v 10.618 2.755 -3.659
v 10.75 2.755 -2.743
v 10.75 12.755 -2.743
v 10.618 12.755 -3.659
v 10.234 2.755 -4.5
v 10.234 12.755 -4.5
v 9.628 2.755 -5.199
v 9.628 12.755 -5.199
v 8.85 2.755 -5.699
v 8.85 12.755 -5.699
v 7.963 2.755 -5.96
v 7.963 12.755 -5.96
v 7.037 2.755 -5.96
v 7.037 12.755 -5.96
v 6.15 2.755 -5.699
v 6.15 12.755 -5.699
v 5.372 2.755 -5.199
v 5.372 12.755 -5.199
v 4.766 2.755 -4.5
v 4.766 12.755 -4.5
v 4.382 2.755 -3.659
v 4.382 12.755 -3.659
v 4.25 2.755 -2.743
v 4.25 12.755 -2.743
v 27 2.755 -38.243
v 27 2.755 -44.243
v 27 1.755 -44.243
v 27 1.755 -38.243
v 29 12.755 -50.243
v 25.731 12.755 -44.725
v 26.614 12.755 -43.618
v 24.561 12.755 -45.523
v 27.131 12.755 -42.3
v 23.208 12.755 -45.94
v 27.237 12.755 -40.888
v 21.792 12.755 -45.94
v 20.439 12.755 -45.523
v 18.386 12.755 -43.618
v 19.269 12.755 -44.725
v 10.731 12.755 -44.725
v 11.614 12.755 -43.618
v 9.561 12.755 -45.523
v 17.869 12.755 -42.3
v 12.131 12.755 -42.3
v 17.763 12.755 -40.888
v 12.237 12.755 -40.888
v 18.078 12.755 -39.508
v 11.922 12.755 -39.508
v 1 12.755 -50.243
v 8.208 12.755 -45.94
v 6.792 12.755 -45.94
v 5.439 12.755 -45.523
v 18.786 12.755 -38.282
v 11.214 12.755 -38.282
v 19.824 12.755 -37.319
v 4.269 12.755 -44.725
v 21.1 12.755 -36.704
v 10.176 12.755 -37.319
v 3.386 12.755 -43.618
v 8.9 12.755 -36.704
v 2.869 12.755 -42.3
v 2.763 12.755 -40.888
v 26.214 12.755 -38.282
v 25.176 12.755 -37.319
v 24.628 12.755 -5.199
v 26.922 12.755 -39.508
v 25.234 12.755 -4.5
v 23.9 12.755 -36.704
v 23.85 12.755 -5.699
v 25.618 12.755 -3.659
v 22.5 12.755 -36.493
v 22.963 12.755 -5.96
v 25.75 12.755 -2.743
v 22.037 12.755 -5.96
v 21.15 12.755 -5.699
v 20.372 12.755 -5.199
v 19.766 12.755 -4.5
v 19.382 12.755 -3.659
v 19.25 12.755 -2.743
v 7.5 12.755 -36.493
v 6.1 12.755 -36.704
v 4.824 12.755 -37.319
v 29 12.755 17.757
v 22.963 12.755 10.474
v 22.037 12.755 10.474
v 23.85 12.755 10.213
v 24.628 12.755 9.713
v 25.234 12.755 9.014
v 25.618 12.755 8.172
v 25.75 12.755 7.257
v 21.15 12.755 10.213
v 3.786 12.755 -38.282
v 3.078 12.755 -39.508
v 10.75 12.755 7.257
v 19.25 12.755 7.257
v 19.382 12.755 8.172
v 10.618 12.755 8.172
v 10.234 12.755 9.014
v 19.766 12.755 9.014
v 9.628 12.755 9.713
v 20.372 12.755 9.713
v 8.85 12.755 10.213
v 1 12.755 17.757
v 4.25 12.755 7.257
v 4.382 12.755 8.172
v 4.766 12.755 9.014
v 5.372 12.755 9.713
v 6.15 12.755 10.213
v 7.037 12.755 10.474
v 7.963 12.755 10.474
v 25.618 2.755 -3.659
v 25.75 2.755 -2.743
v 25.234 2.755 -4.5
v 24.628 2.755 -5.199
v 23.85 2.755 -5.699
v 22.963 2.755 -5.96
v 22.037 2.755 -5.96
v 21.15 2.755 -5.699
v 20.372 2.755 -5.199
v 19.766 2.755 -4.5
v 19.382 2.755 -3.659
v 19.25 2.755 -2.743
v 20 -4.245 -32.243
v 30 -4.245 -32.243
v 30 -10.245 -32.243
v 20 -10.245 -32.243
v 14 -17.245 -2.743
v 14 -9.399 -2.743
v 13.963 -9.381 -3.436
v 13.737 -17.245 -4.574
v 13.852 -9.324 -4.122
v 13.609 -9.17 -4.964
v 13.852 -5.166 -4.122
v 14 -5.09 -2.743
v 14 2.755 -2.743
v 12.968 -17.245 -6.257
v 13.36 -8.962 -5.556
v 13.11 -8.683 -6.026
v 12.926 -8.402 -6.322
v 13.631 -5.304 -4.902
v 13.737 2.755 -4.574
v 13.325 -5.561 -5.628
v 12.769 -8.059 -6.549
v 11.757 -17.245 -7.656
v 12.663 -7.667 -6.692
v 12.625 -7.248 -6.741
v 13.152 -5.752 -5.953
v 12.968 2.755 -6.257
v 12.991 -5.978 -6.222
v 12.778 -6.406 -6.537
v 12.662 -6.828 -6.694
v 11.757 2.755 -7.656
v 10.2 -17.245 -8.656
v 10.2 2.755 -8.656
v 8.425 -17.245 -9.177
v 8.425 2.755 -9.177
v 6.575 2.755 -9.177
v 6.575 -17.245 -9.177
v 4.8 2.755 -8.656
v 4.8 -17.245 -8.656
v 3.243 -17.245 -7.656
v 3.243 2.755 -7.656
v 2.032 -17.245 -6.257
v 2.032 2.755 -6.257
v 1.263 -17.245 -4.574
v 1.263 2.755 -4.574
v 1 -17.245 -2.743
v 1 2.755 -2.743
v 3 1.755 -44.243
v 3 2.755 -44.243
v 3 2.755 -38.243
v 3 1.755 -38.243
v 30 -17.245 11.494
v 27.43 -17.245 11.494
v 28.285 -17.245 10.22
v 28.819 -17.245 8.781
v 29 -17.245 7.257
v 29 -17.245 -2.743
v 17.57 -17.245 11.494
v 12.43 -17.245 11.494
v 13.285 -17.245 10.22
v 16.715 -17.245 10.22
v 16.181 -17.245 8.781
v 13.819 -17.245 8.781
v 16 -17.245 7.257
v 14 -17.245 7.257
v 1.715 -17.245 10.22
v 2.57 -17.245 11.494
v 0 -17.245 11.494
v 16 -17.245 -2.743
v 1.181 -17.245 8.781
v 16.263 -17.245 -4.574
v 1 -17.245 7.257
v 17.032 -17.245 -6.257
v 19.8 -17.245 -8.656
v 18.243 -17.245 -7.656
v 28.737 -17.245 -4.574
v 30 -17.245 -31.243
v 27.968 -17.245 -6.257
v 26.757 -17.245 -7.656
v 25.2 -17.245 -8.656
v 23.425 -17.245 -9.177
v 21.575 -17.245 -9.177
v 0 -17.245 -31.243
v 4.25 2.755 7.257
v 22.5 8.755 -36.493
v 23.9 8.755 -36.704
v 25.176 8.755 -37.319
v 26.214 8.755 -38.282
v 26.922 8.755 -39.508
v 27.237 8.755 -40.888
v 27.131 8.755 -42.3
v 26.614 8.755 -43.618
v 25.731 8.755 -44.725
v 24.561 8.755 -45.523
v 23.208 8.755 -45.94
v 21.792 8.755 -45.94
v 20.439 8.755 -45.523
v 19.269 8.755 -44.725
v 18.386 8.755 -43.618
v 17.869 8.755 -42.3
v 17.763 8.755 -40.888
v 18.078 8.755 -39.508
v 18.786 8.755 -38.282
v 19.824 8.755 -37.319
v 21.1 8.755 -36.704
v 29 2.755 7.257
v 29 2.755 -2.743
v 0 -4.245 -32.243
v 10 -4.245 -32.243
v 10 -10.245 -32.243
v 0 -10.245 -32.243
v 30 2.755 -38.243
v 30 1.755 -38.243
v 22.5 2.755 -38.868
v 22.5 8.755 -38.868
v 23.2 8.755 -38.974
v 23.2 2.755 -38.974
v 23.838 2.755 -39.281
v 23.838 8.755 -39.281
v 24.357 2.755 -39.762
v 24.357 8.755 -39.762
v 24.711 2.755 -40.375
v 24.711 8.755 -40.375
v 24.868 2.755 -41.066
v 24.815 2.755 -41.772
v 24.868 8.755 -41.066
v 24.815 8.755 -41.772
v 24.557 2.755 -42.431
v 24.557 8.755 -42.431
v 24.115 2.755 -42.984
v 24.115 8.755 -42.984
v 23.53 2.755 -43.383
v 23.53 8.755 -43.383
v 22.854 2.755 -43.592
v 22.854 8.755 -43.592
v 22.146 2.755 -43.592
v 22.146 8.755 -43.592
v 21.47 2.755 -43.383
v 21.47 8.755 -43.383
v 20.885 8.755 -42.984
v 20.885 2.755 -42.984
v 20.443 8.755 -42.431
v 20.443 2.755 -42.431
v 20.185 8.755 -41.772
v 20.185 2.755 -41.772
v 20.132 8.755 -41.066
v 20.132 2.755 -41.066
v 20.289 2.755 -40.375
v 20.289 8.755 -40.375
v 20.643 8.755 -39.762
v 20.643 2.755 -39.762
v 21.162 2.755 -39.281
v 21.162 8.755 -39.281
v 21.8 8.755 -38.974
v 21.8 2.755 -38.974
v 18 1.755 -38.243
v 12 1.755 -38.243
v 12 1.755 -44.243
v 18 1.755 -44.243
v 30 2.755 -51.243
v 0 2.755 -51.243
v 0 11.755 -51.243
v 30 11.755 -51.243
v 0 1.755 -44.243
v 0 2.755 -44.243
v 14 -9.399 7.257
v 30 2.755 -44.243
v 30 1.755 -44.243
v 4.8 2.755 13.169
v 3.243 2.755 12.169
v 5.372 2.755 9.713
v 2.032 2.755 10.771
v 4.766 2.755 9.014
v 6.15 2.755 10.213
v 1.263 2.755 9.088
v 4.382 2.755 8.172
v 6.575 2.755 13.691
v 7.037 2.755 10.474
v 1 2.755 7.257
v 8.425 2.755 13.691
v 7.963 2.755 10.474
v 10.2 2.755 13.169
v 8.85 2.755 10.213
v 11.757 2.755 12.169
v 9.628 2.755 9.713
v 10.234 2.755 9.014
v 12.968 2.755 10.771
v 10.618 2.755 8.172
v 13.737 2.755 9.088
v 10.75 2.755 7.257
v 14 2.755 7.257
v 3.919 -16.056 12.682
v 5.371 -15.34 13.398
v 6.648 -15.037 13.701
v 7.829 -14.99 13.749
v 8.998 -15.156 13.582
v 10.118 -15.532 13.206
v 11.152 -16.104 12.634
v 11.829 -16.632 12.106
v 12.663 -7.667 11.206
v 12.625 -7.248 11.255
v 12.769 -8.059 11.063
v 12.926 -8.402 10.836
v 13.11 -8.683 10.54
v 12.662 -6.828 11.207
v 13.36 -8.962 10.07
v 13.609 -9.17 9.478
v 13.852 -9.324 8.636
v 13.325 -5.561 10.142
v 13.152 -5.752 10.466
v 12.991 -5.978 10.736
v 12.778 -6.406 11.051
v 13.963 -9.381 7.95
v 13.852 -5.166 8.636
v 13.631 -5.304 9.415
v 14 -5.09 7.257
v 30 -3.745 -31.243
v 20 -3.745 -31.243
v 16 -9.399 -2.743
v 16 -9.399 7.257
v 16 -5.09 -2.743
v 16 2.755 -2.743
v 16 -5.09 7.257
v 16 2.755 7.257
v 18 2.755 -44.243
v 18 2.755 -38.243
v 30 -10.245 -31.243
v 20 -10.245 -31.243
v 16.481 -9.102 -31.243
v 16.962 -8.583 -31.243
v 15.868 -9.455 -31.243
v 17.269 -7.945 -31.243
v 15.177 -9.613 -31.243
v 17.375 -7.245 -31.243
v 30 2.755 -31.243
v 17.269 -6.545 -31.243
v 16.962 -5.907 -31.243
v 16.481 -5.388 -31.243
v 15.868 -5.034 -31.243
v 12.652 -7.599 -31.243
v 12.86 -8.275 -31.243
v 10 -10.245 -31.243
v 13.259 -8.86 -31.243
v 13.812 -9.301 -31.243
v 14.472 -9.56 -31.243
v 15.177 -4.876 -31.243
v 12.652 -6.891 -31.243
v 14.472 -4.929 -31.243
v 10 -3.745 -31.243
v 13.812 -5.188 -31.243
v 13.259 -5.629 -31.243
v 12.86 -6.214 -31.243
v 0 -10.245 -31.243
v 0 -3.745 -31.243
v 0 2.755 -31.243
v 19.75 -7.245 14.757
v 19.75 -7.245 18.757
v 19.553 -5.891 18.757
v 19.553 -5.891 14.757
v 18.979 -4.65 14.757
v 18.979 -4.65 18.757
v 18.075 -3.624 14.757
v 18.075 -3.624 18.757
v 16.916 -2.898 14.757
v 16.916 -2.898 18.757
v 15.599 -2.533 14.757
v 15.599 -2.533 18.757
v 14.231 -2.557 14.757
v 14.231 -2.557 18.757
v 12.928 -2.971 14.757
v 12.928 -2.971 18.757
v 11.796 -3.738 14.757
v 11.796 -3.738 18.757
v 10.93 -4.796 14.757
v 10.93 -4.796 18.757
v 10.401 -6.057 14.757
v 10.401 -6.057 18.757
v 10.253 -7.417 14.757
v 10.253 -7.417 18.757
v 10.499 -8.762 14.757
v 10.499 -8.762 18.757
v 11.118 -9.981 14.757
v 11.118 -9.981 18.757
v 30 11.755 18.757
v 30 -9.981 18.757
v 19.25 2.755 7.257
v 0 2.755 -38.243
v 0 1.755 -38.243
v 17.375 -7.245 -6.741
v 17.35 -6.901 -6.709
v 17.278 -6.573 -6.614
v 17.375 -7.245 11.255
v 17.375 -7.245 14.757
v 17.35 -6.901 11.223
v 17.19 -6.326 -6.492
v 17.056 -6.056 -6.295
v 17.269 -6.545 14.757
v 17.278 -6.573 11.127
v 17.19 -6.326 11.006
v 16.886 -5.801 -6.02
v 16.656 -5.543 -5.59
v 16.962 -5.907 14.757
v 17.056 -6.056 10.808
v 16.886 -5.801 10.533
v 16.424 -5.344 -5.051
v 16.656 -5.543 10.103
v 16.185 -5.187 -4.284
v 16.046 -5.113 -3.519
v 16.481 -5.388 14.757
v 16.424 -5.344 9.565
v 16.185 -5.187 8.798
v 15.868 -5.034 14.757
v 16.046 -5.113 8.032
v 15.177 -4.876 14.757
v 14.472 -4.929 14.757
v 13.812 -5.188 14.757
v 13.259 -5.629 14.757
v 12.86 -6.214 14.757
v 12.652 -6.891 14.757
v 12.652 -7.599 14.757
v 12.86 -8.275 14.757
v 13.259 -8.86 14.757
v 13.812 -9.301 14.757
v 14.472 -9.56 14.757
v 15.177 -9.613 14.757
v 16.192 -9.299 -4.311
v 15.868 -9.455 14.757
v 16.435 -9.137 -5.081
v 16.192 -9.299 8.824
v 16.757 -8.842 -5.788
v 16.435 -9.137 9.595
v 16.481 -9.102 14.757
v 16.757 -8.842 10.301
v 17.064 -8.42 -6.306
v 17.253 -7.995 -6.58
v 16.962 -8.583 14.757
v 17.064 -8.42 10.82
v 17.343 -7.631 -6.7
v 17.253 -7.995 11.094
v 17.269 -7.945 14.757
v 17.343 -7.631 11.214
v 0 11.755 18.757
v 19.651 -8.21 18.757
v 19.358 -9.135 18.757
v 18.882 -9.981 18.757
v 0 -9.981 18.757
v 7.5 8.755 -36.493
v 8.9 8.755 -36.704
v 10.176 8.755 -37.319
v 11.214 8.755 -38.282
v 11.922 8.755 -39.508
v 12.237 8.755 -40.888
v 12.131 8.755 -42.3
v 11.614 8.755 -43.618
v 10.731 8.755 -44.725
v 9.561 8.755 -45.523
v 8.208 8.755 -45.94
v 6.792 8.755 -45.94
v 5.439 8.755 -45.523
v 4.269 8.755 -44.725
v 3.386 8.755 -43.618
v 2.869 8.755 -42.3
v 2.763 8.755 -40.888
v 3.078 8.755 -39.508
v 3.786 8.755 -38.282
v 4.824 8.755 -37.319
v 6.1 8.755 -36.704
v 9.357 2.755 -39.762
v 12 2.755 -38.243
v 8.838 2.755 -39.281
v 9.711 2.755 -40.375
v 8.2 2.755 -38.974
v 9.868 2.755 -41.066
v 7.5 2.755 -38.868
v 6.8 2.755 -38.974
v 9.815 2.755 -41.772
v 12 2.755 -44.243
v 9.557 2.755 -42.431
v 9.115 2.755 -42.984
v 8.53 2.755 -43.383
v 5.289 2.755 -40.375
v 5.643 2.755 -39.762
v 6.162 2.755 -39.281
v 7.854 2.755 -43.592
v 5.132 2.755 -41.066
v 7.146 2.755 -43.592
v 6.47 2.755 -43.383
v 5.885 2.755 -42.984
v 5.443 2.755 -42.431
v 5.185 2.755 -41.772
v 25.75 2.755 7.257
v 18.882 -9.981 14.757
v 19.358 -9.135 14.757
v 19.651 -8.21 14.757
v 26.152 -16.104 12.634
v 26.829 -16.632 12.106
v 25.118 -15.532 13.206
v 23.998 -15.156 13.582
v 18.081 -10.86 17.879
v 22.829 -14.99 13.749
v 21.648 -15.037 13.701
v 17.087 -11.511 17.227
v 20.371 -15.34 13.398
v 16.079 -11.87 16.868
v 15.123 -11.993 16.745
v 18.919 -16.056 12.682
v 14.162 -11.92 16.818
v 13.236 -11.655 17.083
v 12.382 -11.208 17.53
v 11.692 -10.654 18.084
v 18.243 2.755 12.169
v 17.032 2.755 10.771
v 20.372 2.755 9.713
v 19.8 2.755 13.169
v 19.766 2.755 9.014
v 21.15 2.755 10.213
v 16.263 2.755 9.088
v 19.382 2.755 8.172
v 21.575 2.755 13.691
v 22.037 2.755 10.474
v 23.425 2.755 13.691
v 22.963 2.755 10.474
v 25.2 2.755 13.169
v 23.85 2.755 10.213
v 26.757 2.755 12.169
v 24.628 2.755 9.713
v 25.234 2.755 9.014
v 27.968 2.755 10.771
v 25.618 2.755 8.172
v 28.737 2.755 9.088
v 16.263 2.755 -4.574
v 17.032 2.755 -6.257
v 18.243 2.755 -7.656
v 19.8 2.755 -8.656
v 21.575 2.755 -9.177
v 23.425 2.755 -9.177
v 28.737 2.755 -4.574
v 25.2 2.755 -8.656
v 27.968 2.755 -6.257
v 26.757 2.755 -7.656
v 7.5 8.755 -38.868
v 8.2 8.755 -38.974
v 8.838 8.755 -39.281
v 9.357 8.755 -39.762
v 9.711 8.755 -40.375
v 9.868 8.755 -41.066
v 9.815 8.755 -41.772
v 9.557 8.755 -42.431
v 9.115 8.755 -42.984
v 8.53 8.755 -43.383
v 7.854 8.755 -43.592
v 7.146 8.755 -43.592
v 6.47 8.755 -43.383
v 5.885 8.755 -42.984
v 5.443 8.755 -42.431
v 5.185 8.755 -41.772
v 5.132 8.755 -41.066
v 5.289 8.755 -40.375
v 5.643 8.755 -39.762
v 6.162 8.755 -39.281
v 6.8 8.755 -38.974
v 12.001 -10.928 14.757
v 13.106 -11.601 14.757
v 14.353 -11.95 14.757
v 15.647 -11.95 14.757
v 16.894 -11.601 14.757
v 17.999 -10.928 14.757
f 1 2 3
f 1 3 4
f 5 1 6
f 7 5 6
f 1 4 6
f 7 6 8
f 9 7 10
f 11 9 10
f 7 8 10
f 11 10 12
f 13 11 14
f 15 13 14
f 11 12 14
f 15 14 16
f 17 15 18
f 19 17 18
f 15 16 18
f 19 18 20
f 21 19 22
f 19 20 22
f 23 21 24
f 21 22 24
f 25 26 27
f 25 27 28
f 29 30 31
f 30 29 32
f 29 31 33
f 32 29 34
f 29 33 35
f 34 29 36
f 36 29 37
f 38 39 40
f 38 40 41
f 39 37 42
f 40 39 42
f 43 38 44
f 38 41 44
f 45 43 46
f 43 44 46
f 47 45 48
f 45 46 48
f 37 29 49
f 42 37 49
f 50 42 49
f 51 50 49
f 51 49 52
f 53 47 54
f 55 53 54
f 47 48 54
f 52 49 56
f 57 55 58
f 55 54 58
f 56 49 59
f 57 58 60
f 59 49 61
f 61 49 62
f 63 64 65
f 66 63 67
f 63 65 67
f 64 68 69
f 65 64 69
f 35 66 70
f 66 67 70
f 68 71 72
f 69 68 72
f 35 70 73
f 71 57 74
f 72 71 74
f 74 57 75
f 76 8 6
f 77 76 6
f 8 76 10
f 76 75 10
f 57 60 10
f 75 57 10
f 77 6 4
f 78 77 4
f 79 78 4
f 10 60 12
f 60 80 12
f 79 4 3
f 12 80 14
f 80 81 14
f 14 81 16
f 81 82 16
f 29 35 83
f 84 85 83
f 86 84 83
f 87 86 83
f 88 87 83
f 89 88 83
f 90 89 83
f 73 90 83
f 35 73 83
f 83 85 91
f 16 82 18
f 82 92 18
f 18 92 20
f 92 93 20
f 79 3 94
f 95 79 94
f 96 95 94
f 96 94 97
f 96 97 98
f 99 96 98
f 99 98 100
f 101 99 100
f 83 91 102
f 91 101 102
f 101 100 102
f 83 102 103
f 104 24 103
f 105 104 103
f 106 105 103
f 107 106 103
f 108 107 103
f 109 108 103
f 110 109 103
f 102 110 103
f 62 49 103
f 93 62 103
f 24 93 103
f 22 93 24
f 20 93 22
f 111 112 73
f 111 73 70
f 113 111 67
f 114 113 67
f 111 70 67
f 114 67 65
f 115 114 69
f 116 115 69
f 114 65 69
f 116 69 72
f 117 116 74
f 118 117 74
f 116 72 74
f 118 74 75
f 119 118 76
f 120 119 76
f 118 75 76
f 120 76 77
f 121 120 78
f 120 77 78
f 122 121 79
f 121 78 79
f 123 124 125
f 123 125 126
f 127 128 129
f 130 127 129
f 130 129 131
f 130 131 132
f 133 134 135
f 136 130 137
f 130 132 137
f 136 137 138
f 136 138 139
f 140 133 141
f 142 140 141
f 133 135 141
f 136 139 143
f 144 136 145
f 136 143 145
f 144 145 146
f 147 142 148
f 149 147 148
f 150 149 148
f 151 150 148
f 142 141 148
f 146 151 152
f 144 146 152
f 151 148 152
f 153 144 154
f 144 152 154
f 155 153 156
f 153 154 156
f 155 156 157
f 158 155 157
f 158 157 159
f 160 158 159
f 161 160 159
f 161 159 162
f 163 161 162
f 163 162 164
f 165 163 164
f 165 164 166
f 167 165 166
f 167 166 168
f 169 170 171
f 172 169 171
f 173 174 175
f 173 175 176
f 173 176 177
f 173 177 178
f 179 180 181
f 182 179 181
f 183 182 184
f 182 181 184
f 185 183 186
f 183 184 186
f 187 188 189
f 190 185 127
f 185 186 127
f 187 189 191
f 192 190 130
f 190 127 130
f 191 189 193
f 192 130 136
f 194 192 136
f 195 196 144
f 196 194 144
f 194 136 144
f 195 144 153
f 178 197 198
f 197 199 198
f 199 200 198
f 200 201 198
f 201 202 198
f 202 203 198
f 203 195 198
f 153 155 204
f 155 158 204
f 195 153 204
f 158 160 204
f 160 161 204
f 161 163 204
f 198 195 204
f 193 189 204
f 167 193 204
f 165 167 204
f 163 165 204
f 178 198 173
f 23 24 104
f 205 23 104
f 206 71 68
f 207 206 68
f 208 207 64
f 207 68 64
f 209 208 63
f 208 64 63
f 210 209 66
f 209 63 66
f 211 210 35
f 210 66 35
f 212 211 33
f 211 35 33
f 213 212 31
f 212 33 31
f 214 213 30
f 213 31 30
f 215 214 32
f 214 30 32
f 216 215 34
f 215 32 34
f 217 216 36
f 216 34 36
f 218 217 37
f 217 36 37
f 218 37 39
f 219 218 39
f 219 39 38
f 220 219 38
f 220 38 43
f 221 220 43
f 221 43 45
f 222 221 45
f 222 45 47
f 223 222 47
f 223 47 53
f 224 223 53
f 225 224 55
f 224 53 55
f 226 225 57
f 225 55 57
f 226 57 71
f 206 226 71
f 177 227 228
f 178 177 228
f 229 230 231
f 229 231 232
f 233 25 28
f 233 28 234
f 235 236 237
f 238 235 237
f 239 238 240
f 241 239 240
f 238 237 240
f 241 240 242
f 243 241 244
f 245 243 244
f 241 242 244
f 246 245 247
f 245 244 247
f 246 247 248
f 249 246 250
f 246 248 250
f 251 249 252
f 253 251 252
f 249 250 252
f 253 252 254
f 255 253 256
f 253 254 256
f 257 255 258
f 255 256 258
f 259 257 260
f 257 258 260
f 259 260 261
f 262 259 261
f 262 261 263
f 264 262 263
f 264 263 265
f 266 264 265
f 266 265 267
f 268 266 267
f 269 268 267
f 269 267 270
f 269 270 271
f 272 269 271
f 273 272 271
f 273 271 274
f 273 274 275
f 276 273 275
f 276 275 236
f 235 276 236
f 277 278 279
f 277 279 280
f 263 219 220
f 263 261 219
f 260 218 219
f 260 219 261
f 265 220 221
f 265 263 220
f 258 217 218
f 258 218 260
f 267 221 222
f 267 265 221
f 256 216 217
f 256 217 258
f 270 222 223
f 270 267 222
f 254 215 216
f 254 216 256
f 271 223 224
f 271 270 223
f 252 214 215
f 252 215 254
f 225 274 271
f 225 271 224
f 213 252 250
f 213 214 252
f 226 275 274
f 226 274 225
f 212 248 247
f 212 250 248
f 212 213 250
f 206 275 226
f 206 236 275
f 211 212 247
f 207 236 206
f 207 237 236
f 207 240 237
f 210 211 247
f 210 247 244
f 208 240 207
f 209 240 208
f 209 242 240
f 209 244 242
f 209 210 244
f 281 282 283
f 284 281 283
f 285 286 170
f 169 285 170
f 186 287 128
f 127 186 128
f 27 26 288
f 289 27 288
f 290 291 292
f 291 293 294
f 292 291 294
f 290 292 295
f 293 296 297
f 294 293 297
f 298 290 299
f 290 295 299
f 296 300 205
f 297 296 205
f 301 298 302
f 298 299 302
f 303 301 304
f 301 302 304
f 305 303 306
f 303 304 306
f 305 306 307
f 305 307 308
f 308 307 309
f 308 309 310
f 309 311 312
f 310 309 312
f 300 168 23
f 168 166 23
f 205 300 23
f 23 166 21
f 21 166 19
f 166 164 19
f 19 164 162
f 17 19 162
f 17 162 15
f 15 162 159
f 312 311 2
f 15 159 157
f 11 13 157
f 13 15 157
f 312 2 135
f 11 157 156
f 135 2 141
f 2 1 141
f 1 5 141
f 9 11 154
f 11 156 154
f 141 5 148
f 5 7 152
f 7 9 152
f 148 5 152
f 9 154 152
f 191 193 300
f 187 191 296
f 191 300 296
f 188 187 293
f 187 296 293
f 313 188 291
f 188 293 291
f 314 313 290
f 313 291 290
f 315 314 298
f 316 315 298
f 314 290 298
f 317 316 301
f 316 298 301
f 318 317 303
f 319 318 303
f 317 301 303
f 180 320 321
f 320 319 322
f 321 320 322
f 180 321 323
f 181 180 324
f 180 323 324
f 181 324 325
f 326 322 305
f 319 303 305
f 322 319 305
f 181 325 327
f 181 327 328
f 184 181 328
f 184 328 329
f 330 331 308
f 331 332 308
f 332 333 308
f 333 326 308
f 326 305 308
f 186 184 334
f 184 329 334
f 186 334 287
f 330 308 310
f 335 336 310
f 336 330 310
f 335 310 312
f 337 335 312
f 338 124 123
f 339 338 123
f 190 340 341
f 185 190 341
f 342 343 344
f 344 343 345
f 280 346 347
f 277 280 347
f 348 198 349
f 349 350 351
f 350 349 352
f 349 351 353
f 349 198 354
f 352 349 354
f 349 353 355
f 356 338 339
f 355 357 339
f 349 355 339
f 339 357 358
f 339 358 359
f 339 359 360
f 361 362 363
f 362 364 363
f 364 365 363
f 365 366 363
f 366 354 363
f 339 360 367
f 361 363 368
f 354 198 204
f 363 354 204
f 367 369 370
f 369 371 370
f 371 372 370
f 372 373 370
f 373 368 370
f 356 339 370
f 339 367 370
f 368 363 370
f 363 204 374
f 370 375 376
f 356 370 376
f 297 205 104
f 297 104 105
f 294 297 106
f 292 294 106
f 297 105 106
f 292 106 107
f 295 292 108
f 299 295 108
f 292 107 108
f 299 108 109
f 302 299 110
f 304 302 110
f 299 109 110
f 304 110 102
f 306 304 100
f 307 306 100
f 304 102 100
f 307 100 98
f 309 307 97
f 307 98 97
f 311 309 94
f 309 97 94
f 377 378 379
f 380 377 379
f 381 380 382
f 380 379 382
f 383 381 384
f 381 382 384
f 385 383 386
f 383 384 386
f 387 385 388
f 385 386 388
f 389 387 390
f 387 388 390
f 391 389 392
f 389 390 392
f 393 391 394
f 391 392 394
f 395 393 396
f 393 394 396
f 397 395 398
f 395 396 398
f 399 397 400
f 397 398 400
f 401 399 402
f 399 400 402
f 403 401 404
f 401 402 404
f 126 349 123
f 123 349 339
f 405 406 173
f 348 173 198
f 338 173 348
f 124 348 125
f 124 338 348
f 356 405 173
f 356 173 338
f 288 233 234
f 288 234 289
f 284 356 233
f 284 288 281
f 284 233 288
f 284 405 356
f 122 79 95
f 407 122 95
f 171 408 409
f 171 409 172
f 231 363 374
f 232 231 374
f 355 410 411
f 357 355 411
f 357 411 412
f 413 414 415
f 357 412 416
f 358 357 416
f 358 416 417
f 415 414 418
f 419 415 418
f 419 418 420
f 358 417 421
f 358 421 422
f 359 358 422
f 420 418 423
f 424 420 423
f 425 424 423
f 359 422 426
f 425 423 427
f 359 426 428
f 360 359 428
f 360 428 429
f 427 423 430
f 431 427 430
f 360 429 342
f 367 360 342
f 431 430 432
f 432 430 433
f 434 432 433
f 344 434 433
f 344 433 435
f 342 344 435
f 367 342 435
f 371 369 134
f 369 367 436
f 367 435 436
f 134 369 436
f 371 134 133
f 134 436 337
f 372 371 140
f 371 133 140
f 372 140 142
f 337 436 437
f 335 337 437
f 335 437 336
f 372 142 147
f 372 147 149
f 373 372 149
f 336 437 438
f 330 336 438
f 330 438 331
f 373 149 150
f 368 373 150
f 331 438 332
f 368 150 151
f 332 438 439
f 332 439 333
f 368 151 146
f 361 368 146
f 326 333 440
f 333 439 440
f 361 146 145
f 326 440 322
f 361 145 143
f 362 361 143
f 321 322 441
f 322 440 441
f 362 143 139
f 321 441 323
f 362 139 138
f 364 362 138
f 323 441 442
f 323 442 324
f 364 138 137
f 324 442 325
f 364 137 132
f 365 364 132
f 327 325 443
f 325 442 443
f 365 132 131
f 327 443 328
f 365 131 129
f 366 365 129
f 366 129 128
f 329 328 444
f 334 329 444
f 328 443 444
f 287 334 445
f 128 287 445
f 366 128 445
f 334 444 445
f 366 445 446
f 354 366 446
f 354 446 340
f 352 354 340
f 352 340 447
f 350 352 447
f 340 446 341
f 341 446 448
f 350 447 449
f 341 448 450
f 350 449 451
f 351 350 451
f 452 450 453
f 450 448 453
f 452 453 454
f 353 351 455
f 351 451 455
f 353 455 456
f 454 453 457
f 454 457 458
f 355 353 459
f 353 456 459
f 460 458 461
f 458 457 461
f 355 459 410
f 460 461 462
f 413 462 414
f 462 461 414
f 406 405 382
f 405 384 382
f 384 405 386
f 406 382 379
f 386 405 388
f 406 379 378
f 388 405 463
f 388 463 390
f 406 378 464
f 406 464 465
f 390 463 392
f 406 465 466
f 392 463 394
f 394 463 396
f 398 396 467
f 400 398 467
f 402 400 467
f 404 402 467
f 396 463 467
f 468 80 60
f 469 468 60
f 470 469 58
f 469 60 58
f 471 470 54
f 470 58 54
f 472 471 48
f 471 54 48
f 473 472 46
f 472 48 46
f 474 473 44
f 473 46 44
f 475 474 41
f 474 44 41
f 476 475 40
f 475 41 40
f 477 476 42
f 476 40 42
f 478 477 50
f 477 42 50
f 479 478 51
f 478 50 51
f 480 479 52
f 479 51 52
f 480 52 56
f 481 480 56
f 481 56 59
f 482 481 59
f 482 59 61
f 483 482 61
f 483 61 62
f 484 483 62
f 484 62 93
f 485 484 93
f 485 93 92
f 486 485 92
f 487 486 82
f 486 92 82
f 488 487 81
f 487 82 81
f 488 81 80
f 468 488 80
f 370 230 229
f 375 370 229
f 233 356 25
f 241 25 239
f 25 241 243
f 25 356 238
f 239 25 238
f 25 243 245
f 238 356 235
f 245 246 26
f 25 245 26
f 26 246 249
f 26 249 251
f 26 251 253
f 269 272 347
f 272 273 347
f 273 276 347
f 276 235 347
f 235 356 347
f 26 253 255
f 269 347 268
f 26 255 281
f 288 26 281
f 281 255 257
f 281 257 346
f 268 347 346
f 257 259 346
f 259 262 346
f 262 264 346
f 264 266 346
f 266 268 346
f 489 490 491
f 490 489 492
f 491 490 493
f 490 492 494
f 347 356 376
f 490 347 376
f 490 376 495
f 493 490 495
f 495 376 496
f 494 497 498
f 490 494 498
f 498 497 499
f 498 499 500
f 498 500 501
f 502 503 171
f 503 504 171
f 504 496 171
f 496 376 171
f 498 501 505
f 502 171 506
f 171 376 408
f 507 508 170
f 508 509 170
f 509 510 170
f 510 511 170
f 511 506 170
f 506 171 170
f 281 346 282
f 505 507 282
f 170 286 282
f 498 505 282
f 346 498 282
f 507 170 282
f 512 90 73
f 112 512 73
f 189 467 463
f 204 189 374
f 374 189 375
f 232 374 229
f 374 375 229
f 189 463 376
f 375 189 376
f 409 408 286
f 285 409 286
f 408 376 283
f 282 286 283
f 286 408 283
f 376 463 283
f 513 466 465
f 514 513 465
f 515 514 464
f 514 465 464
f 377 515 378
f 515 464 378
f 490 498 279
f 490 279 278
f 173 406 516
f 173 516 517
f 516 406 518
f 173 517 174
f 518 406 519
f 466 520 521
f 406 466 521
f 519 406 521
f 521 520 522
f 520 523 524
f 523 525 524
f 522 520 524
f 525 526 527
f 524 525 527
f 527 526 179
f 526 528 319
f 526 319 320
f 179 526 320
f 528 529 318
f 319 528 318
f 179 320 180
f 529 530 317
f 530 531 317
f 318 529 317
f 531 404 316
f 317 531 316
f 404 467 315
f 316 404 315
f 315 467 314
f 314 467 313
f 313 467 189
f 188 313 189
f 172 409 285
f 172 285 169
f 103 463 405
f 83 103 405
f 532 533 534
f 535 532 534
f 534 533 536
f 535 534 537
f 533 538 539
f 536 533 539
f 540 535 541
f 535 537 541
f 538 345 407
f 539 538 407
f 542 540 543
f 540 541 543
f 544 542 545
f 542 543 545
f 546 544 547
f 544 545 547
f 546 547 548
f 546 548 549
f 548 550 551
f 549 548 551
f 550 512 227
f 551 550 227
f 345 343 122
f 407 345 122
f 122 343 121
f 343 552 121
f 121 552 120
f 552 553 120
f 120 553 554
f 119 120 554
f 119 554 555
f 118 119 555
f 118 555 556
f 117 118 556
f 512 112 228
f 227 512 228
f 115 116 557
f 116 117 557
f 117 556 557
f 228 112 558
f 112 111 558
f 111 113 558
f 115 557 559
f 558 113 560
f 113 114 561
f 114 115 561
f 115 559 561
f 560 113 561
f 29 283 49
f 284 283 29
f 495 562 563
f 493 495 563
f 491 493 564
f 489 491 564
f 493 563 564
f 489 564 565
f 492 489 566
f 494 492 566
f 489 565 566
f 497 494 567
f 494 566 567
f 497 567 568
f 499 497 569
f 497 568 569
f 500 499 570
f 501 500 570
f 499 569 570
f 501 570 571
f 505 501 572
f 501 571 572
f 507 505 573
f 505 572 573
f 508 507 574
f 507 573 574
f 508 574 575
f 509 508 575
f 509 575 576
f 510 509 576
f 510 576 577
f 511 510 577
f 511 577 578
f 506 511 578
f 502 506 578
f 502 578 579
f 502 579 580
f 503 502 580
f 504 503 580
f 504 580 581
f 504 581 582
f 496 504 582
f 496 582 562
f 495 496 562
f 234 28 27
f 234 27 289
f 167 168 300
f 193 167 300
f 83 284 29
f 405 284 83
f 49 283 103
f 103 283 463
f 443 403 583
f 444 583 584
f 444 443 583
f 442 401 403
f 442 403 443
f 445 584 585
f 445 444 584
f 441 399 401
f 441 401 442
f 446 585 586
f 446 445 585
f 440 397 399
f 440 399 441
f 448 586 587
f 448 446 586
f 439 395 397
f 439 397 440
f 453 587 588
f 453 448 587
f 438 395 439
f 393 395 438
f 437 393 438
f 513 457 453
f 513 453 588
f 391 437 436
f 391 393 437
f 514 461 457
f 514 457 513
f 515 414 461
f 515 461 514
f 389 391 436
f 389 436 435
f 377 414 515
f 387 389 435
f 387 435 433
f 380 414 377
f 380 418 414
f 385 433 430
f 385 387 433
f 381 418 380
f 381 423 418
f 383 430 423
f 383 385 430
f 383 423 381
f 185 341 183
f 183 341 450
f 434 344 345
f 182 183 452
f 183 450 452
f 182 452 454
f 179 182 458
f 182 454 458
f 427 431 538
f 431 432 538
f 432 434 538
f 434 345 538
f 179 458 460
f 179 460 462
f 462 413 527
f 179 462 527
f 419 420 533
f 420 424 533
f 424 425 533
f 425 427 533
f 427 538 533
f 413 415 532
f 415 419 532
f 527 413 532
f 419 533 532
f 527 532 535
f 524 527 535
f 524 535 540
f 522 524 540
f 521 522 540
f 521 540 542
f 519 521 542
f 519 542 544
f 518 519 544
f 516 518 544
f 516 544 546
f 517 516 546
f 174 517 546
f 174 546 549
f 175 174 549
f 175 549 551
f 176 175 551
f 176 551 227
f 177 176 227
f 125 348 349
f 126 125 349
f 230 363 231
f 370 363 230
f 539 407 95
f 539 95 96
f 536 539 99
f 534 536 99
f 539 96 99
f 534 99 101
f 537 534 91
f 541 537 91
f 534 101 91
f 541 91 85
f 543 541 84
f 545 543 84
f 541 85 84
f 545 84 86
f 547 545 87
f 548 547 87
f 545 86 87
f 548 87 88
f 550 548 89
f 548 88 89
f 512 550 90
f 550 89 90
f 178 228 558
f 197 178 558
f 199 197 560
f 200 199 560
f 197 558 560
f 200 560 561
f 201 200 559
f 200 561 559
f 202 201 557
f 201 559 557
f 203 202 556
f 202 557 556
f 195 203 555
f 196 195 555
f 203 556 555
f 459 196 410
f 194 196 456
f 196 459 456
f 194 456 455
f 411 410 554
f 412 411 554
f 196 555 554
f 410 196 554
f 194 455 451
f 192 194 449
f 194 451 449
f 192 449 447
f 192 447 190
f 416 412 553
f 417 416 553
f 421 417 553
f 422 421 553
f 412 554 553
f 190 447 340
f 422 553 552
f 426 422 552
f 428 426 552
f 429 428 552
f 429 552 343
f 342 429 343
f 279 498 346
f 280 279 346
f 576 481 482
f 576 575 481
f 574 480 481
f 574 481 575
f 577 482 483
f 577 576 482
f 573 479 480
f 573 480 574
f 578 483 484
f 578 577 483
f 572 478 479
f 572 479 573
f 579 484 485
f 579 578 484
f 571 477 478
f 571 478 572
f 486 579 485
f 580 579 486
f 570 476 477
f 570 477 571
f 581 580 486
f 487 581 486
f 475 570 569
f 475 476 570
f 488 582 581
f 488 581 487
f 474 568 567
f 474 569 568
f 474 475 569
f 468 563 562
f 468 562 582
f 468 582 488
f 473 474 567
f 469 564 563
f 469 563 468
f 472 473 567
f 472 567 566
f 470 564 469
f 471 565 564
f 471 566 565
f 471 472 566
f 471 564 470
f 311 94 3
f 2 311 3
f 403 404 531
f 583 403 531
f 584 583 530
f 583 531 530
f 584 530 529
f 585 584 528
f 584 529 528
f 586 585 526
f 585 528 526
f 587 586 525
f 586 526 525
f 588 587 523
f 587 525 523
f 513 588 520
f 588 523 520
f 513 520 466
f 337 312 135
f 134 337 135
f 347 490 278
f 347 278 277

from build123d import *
from OCP.BRepFilletAPI import BRepFilletAPI_MakeChamfer

# Parameters (mm, degrees)
RESSALTO_EXTRUS_O1_DEPTH = 30
CORTE_EXTRUS_O1_REACH    = 68.527
ESBO_O2_R                = 2.375
ESBO_O2_3_R              = 4.75
ESBO_O2_3_R_2            = 2.375
CORTE_EXTRUS_O3_DEPTH    = 4
CORTE_EXTRUS_O2_REACH    = 80.086
ESBO_O3_R                = 2.375
ESBO_O3_3_R              = 2.375
CORTE_EXTRUS_O4_DEPTH    = 4
ESBO_O4_W                = 6
ESBO_O4_H                = 6
ESBO_O4_W_2              = 3
RESSALTO_EXTRUS_O2_DEPTH = 1
CORTE_EXTRUS_O5_START    = -10
CORTE_EXTRUS_O5_DEPTH    = 57.527149202
CHANFRO1_SIZE            = 1
ESBO_O6_W                = 10
ESBO_O6_H                = 6
RESSALTO_EXTRUS_O3_DEPTH = 1
CHANFRO2_SIZE            = 0.5
CHANFRO2_SIZE_2          = 1


with BuildPart() as part:
    # Esboço1 → Ressalto-extrusão1 (new body)
    with BuildSketch(Plane(origin=(0, 0, 0), x_dir=(0, 0, -1), z_dir=(1, 0, 0))):
        Polygon((51.243161309, 12.755336939), (-18.756838691, 12.755336939), (-18.756838691, -9.981327227), (-11.493502857, -17.244663061), (31.243161309, -17.244663061), (31.243161309, 2.755336939), (51.243161309, 2.755336939), align=None)
    extrude(amount=RESSALTO_EXTRUS_O1_DEPTH)

    # Esboço2 → Corte-extrusão1 (cut, up to next)
    with BuildSketch(Plane(origin=(0, 12.755336939, 0), x_dir=(1, 0, 0), z_dir=(0, 1, 0)), mode=Mode.PRIVATE) as corte_extrus_o1_sk1:
        with Locations(Location((7.5, 41.243161309, 0), (0, 0, 270))):
            Circle(ESBO_O2_R)
    corte_extrus_o1_tool1 = extrude(corte_extrus_o1_sk1.sketch, amount=-CORTE_EXTRUS_O1_REACH, mode=Mode.PRIVATE) & part.part
    # Esboço2 → Corte-extrusão1 (cut, up to next)
    with BuildSketch(Plane(origin=(0, 12.755336939, 0), x_dir=(1, 0, 0), z_dir=(0, 1, 0)), mode=Mode.PRIVATE) as corte_extrus_o1_sk2:
        with Locations(Location((22.5, 41.243161309, 0), (0, 0, 270))):
            Circle(ESBO_O2_R)
    corte_extrus_o1_tool2 = extrude(corte_extrus_o1_sk2.sketch, amount=-CORTE_EXTRUS_O1_REACH, mode=Mode.PRIVATE) & part.part
    # Esboço2 → Corte-extrusão1 (cut, up to next)
    with BuildSketch(Plane(origin=(0, 12.755336939, 0), x_dir=(1, 0, 0), z_dir=(0, 1, 0)), mode=Mode.PRIVATE) as corte_extrus_o1_sk3:
        with BuildLine():
            Line((4.25, 2.743161309), (4.25, -7.256838691))
            ThreePointArc((4.25, -7.256838691), (7.5, -10.506838691), (10.75, -7.256838691))
            Line((10.75, -7.256838691), (10.75, 2.743161309))
            ThreePointArc((10.75, 2.743161309), (7.5, 5.993161309), (4.25, 2.743161309))
        make_face()
    corte_extrus_o1_tool3 = extrude(corte_extrus_o1_sk3.sketch, amount=-CORTE_EXTRUS_O1_REACH, mode=Mode.PRIVATE) & part.part
    # Esboço2 → Corte-extrusão1 (cut, up to next)
    with BuildSketch(Plane(origin=(0, 12.755336939, 0), x_dir=(1, 0, 0), z_dir=(0, 1, 0)), mode=Mode.PRIVATE) as corte_extrus_o1_sk4:
        with BuildLine():
            Line((19.25, 2.743161309), (19.25, -7.256838691))
            ThreePointArc((19.25, -7.256838691), (22.5, -10.506838691), (25.75, -7.256838691))
            Line((25.75, -7.256838691), (25.75, 2.743161309))
            ThreePointArc((25.75, 2.743161309), (22.5, 5.993161309), (19.25, 2.743161309))
        make_face()
    corte_extrus_o1_tool4 = extrude(corte_extrus_o1_sk4.sketch, amount=-CORTE_EXTRUS_O1_REACH, mode=Mode.PRIVATE) & part.part
    add(corte_extrus_o1_tool1.solids().sort_by_distance((7.5, 12.755337, -41.243161))[0], mode=Mode.SUBTRACT)
    add(corte_extrus_o1_tool2.solids().sort_by_distance((22.5, 12.755337, -41.243161))[0], mode=Mode.SUBTRACT)
    add(corte_extrus_o1_tool3.solids().sort_by_distance((7.5, 12.755337, 2.256839))[0], mode=Mode.SUBTRACT)
    add(corte_extrus_o1_tool4.solids().sort_by_distance((22.5, 12.755337, 2.256839))[0], mode=Mode.SUBTRACT)

    # Esboço2<3> → Corte-extrusão3 (cut)
    # profile 1 of 2: a face of its own
    with BuildSketch(Plane(origin=(0, 12.755336939, 0), x_dir=(1, 0, 0), z_dir=(0, 1, 0))):
        with Locations(Location((7.5, 41.243161309, 0), (0, 0, 270))):
            Circle(ESBO_O2_3_R)
        with Locations(Location((7.5, 41.243161309, 0), (0, 0, 270))):
            Circle(ESBO_O2_3_R_2, mode=Mode.SUBTRACT)
    # profile 2 of 2: a face of its own
    with BuildSketch(Plane(origin=(0, 12.755336939, 0), x_dir=(1, 0, 0), z_dir=(0, 1, 0))):
        with Locations(Location((22.5, 41.243161309, 0), (0, 0, 270))):
            Circle(ESBO_O2_3_R)
        with Locations(Location((22.5, 41.243161309, 0), (0, 0, 270))):
            Circle(ESBO_O2_3_R_2, mode=Mode.SUBTRACT)
    extrude(amount=-CORTE_EXTRUS_O3_DEPTH, mode=Mode.SUBTRACT)

    # Esboço3 → Corte-extrusão2 (cut, up to next)
    with BuildSketch(Plane.XY.offset(18.756838691), mode=Mode.PRIVATE) as corte_extrus_o2_sk1:
        with Locations((15, -7.244663061)):
            Circle(ESBO_O3_R)
    corte_extrus_o2_tool1 = extrude(corte_extrus_o2_sk1.sketch, amount=-CORTE_EXTRUS_O2_REACH, mode=Mode.PRIVATE) & part.part
    add(corte_extrus_o2_tool1.solids().sort_by_distance((15, -7.244663, 18.756839))[0], mode=Mode.SUBTRACT)

    # Esboço3<3> → Corte-extrusão4 (cut)
    # profile 1 of 2: a face of its own
    with BuildSketch(Plane.XY.offset(18.756838691)):
        with BuildLine():
            Line((18.882417963, -9.981327227), (11.117582037, -9.981327227))
            ThreePointArc((11.117582037, -9.981327227), (15, -11.994663061), (18.882417963, -9.981327227))
        make_face()
    # profile 2 of 2: a face of its own
    with BuildSketch(Plane.XY.offset(18.756838691)):
        with BuildLine():
            ThreePointArc((18.882417963, -9.981327227), (19.527912617, -8.680109799), (19.75, -7.244663061))
            ThreePointArc((19.75, -7.244663061), (13.564553262, -2.716750444), (11.117582037, -9.981327227))
            Line((11.117582037, -9.981327227), (18.882417963, -9.981327227))
        make_face()
        with Locations((15, -7.244663061)):
            Circle(ESBO_O3_3_R, mode=Mode.SUBTRACT)
    extrude(amount=-CORTE_EXTRUS_O4_DEPTH, mode=Mode.SUBTRACT)

    # Esboço4 → Ressalto-extrusão2 (add)
    with BuildSketch(Plane.XZ.offset(-2.755336939)):
        with Locations((15, -41.243161309)):
            Rectangle(ESBO_O4_W, ESBO_O4_H)
        with Locations((1.5, -41.243161309)):
            Rectangle(ESBO_O4_W_2, ESBO_O4_H)
        with Locations((28.5, -41.243161309)):
            Rectangle(ESBO_O4_W_2, ESBO_O4_H)
    extrude(amount=RESSALTO_EXTRUS_O2_DEPTH)

    # Esboço2<4> → Corte-extrusão5 (cut, through all)
    # profile 1 of 2: a face of its own
    with BuildSketch(Plane(origin=(0, 12.755336939, 0), x_dir=(1, 0, 0), z_dir=(0, 1, 0)).offset(CORTE_EXTRUS_O5_START)):
        with BuildLine():
            Line((1, 2.743161309), (1, -7.256838691))
            ThreePointArc((1, -7.256838691), (7.5, -13.756838691), (14, -7.256838691))
            Line((14, -7.256838691), (14, 2.743161309))
            ThreePointArc((14, 2.743161309), (7.5, 9.243161309), (1, 2.743161309))
        make_face()
        with BuildLine():
            ThreePointArc((10.75, 2.743161309), (7.5, 5.993161309), (4.25, 2.743161309))
            Line((4.25, 2.743161309), (4.25, -7.256838691))
            ThreePointArc((4.25, -7.256838691), (7.5, -10.506838691), (10.75, -7.256838691))
            Line((10.75, -7.256838691), (10.75, 2.743161309))
        make_face(mode=Mode.SUBTRACT)
    # profile 2 of 2: a face of its own
    with BuildSketch(Plane(origin=(0, 12.755336939, 0), x_dir=(1, 0, 0), z_dir=(0, 1, 0)).offset(CORTE_EXTRUS_O5_START)):
        with BuildLine():
            Line((16, 2.743161309), (16, -7.256838691))
            ThreePointArc((16, -7.256838691), (22.5, -13.756838691), (29, -7.256838691))
            Line((29, -7.256838691), (29, 2.743161309))
            ThreePointArc((29, 2.743161309), (22.5, 9.243161309), (16, 2.743161309))
        make_face()
        with BuildLine():
            ThreePointArc((25.75, 2.743161309), (22.5, 5.993161309), (19.25, 2.743161309))
            Line((19.25, 2.743161309), (19.25, -7.256838691))
            ThreePointArc((19.25, -7.256838691), (22.5, -10.506838691), (25.75, -7.256838691))
            Line((25.75, -7.256838691), (25.75, 2.743161309))
        make_face(mode=Mode.SUBTRACT)
    extrude(amount=-CORTE_EXTRUS_O5_DEPTH, mode=Mode.SUBTRACT)

    # Chanfro1
    chanfro1_edges = [part.edges().sort_by_distance(p)[0] for p in [
        (0, 12.755336939, -16.243161309),
        (30, 12.755336939, -16.243161309),
        (15, 12.755336939, 18.756838691),
        (15, 12.755336939, -51.243161309),
    ]]
    chamfer(chanfro1_edges, length=CHANFRO1_SIZE)

    # Esboço6 → Ressalto-extrusão3 (add)
    with BuildSketch(Plane(origin=(0, 0, -31.243161309), x_dir=(-1, 0, 0), z_dir=(0, 0, -1))):
        with Locations((-25, -7.244663061)):
            Rectangle(ESBO_O6_W, ESBO_O6_H)
        with Locations((-5, -7.244663061)):
            Rectangle(ESBO_O6_W, ESBO_O6_H)
    extrude(amount=RESSALTO_EXTRUS_O3_DEPTH)

    # Chanfro2
    chanfro2_edges_1 = [part.edges().sort_by_distance(p)[0] for p in [
        (25, -4.244663061, -31.243161309),
    ]]
    chanfro2_side_1 = [part.faces().sort_by_distance(p)[0] for p in [
        (25, -4.234663061, -31.243161309),
    ]]
    chanfro2_edges_2 = [part.edges().sort_by_distance(p)[0] for p in [
        (5, -4.244663061, -31.243161309),
    ]]
    chanfro2_side_2 = [part.faces().sort_by_distance(p)[0] for p in [
        (5, -4.234663061, -31.243161309),
    ]]
    chanfro2 = BRepFilletAPI_MakeChamfer(part.part.solid().wrapped)
    for e in chanfro2_edges_1:
        chanfro2.Add(CHANFRO2_SIZE - 0.0001, CHANFRO2_SIZE_2 - 0.0001, e.wrapped, chanfro2_side_1[0].wrapped)
    for e in chanfro2_edges_2:
        chanfro2.Add(CHANFRO2_SIZE - 0.0001, CHANFRO2_SIZE_2 - 0.0001, e.wrapped, chanfro2_side_2[0].wrapped)
    add(Compound.cast(chanfro2.Shape()), mode=Mode.REPLACE)  # a hair under: the kernel refuses the full size


solid = part.part
